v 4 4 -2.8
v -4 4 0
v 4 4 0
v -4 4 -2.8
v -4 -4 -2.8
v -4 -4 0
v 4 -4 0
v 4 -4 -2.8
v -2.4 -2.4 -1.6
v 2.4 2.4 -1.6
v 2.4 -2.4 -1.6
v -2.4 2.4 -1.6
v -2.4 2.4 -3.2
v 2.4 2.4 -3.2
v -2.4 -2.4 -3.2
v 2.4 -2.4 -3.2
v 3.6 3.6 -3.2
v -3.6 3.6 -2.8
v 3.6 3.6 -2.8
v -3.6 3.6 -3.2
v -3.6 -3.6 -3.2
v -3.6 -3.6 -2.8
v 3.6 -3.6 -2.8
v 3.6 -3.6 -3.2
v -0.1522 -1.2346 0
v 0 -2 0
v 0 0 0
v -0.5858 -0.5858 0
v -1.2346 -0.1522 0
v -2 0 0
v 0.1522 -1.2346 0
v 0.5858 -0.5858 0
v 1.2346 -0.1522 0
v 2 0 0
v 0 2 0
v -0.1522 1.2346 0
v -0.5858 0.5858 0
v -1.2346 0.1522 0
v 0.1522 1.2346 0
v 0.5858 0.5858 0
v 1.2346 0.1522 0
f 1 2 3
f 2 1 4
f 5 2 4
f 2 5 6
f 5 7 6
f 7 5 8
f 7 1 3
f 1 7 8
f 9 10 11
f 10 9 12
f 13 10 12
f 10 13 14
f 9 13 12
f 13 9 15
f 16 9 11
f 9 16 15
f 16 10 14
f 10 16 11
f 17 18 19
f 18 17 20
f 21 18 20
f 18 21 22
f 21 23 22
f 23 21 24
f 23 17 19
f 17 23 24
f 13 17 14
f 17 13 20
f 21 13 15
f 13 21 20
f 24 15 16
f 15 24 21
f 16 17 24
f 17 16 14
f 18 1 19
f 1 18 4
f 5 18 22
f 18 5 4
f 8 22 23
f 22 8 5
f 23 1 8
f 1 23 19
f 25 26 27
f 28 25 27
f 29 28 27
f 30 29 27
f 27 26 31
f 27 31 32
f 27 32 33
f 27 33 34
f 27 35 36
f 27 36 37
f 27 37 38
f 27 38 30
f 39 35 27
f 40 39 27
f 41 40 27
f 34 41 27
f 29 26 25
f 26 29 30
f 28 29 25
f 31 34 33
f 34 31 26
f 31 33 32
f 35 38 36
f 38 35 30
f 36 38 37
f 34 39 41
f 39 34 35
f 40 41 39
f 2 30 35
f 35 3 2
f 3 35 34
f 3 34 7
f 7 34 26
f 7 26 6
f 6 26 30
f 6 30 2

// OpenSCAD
// file: ../p/box5.scad
use <../lib.scad>
function ldraw_lib__box5() = [
// 0 Box with 5 Faces and All Edges
// 0 Name: box5.dat
// 0 Author: James Jessiman
// 0 !LDRAW_ORG Primitive UPDATE 2012-01
// 0 !LICENSE Licensed under CC BY 4.0 : see CAreadme.txt
// 
// 0 BFC CERTIFY CCW
  [0,"BFC","CERTIFY"],
  [0,"BFC","CCW"],
// 
// 0 !HISTORY 2002-04-03 [sbliss] Modified for BFC compliance
// 0 !HISTORY 2002-04-25 [PTadmin] Official Update 2002-02
// 0 !HISTORY 2007-06-24 [PTadmin] Header formatted for Contributor Agreement
// 0 !HISTORY 2008-07-01 [PTadmin] Official Update 2008-01
// 0 !HISTORY 2012-02-16 [Philo] Changed to CCW
// 0 !HISTORY 2012-03-30 [PTadmin] Official Update 2012-01
// 
// 
// 2 24 1 1 1 -1 1 1
  [2,24,1,1,1,-1,1,1],
// 2 24 -1 1 1 -1 1 -1
  [2,24,-1,1,1,-1,1,-1],
// 2 24 -1 1 -1 1 1 -1
  [2,24,-1,1,-1,1,1,-1],
// 2 24 1 1 -1 1 1 1
  [2,24,1,1,-1,1,1,1],
// 2 24 1 0 1 -1 0 1
  [2,24,1,0,1,-1,0,1],
// 2 24 -1 0 1 -1 0 -1
  [2,24,-1,0,1,-1,0,-1],
// 2 24 -1 0 -1 1 0 -1
  [2,24,-1,0,-1,1,0,-1],
// 2 24 1 0 -1 1 0 1
  [2,24,1,0,-1,1,0,1],
// 2 24 1 0 1 1 1 1
  [2,24,1,0,1,1,1,1],
// 2 24 -1 0 1 -1 1 1
  [2,24,-1,0,1,-1,1,1],
// 2 24 1 0 -1 1 1 -1
  [2,24,1,0,-1,1,1,-1],
// 2 24 -1 0 -1 -1 1 -1
  [2,24,-1,0,-1,-1,1,-1],
// 4 16 -1 1 1 1 1 1 1 1 -1 -1 1 -1
  [4,16,-1,1,1,1,1,1,1,1,-1,-1,1,-1],
// 4 16 -1 1 1 -1 0 1 1 0 1 1 1 1
  [4,16,-1,1,1,-1,0,1,1,0,1,1,1,1],
// 4 16 -1 1 -1 -1 0 -1 -1 0 1 -1 1 1
  [4,16,-1,1,-1,-1,0,-1,-1,0,1,-1,1,1],
// 4 16 1 1 -1 1 0 -1 -1 0 -1 -1 1 -1
  [4,16,1,1,-1,1,0,-1,-1,0,-1,-1,1,-1],
// 4 16 1 1 1 1 0 1 1 0 -1 1 1 -1
  [4,16,1,1,1,1,0,1,1,0,-1,1,1,-1],
];
module ldraw_lib__box5(step=0, col=false, unit=2/5, alt=false, line=0.2, solid=!$preview)
    makepoly(ldraw_lib__box5(), step=step, col=col, unit=unit, alt=alt, line=line, solid=solid);
ldraw_lib__box5(line=0.2);
// file: ../p/box4.scad
use <../lib.scad>
function ldraw_lib__box4() = [
// 0 Box with 4 Faces (2 Parallel Pairs) and All Edges
// 0 Name: box4.dat
// 0 Author: James Jessiman
// 0 !LDRAW_ORG Primitive UPDATE 2012-01
// 0 !LICENSE Licensed under CC BY 4.0 : see CAreadme.txt
// 
// 0 BFC CERTIFY CCW
  [0,"BFC","CERTIFY"],
  [0,"BFC","CCW"],
// 
// 0 !HISTORY 2002-04-03 [sbliss] Modified for BFC compliance
// 0 !HISTORY 2002-04-25 [PTadmin] Official Update 2002-02
// 0 !HISTORY 2007-06-24 [PTadmin] Header formatted for Contributor Agreement
// 0 !HISTORY 2008-07-01 [PTadmin] Official Update 2008-01
// 0 !HISTORY 2012-02-16 [Philo] Changed to CCW
// 0 !HISTORY 2012-03-30 [PTadmin] Official Update 2012-01
// 
// 
// 2 24 1 1 1 -1 1 1
  [2,24,1,1,1,-1,1,1],
// 2 24 -1 1 1 -1 1 -1
  [2,24,-1,1,1,-1,1,-1],
// 2 24 -1 1 -1 1 1 -1
  [2,24,-1,1,-1,1,1,-1],
// 2 24 1 1 -1 1 1 1
  [2,24,1,1,-1,1,1,1],
// 2 24 1 0 1 -1 0 1
  [2,24,1,0,1,-1,0,1],
// 2 24 -1 0 1 -1 0 -1
  [2,24,-1,0,1,-1,0,-1],
// 2 24 -1 0 -1 1 0 -1
  [2,24,-1,0,-1,1,0,-1],
// 2 24 1 0 -1 1 0 1
  [2,24,1,0,-1,1,0,1],
// 2 24 1 0 1 1 1 1
  [2,24,1,0,1,1,1,1],
// 2 24 -1 0 1 -1 1 1
  [2,24,-1,0,1,-1,1,1],
// 2 24 1 0 -1 1 1 -1
  [2,24,1,0,-1,1,1,-1],
// 2 24 -1 0 -1 -1 1 -1
  [2,24,-1,0,-1,-1,1,-1],
// 4 16 -1 1 1 -1 0 1 1 0 1 1 1 1
  [4,16,-1,1,1,-1,0,1,1,0,1,1,1,1],
// 4 16 -1 1 -1 -1 0 -1 -1 0 1 -1 1 1
  [4,16,-1,1,-1,-1,0,-1,-1,0,1,-1,1,1],
// 4 16 1 1 -1 1 0 -1 -1 0 -1 -1 1 -1
  [4,16,1,1,-1,1,0,-1,-1,0,-1,-1,1,-1],
// 4 16 1 1 1 1 0 1 1 0 -1 1 1 -1
  [4,16,1,1,1,1,0,1,1,0,-1,1,1,-1],
];
module ldraw_lib__box4(step=0, col=false, unit=2/5, alt=false, line=0.2, solid=!$preview)
    makepoly(ldraw_lib__box4(), step=step, col=col, unit=unit, alt=alt, line=line, solid=solid);
ldraw_lib__box4(line=0.2);
// file: s/3070bs01.scad
use <../../lib.scad>
use <../../p/box4.scad>
use <../../p/box5.scad>
function ldraw_lib__s__3070bs01() = [
// 0 ~Tile  1 x  1 with Groove without Top Face
// 0 Name: s\3070bs01.dat
// 0 Author: Chris Dee [cwdee]
// 0 !LDRAW_ORG Subpart UPDATE 2009-02
// 0 !LICENSE Licensed under CC BY 4.0 : see CAreadme.txt
// 
// 0 BFC CERTIFY CCW
  [0,"BFC","CERTIFY"],
  [0,"BFC","CCW"],
// 
// 0 !HISTORY 2009-09-03 [PTadmin] Official Update 2009-02
// 
// 
// 1 16 0 0 0 10 0 0 0 7 0 0 0 10 box4.dat
  [1,16,0,0,0,10,0,0,0,7,0,0,0,10, ldraw_lib__box4()],
// 0 BFC INVERTNEXT
  [0,"BFC","INVERTNEXT"],
// 1 16 0 8 0 6 0 0 0 -4 0 0 0 6 box5.dat
  [1,16,0,8,0,6,0,0,0,-4,0,0,0,6, ldraw_lib__box5()],
// 1 16 0 7 0 9 0 0 0 1 0 0 0 9 box4.dat
  [1,16,0,7,0,9,0,0,0,1,0,0,0,9, ldraw_lib__box4()],
// 
// 4 16 9 8 9 6 8 6 -6 8 6 -9 8 9
  [4,16,9,8,9,6,8,6,-6,8,6,-9,8,9],
// 4 16 -9 8 9 -6 8 6 -6 8 -6 -9 8 -9
  [4,16,-9,8,9,-6,8,6,-6,8,-6,-9,8,-9],
// 4 16 -9 8 -9 -6 8 -6 6 8 -6 9 8 -9
  [4,16,-9,8,-9,-6,8,-6,6,8,-6,9,8,-9],
// 4 16 9 8 -9 6 8 -6 6 8 6 9 8 9
  [4,16,9,8,-9,6,8,-6,6,8,6,9,8,9],
// 
// 4 16 10 7 10 9 7 9 -9 7 9 -10 7 10
  [4,16,10,7,10,9,7,9,-9,7,9,-10,7,10],
// 4 16 -10 7 10 -9 7 9 -9 7 -9 -10 7 -10
  [4,16,-10,7,10,-9,7,9,-9,7,-9,-10,7,-10],
// 4 16 -10 7 -10 -9 7 -9 9 7 -9 10 7 -10
  [4,16,-10,7,-10,-9,7,-9,9,7,-9,10,7,-10],
// 4 16 10 7 -10 9 7 -9 9 7 9 10 7 10
  [4,16,10,7,-10,9,7,-9,9,7,9,10,7,10],
// 0
];
module ldraw_lib__s__3070bs01(step=0, col=false, unit=2/5, alt=false, line=0.2, solid=!$preview)
    makepoly(ldraw_lib__s__3070bs01(), step=step, col=col, unit=unit, alt=alt, line=line, solid=solid);
ldraw_lib__s__3070bs01(line=0.2);
// file: ../p/1-4ndis.scad
use <../lib.scad>
function ldraw_lib__1_4ndis() = [
// 0 Disc Negative 0.25
// 0 Name: 1-4ndis.dat
// 0 Author: James Jessiman
// 0 !LDRAW_ORG Primitive UPDATE 2012-01
// 0 !LICENSE Licensed under CC BY 4.0 : see CAreadme.txt
// 
// 0 BFC CERTIFY CCW
  [0,"BFC","CERTIFY"],
  [0,"BFC","CCW"],
// 
// 0 !HISTORY 2002-03-23 [sbliss] Added BFC Statement
// 0 !HISTORY 2002-04-25 [PTadmin] Official Update 2002-02
// 0 !HISTORY 2007-06-22 [PTadmin] Header formatted for Contributor Agreement
// 0 !HISTORY 2008-07-01 [PTadmin] Official Update 2008-01
// 0 !HISTORY 2012-02-16 [Philo] Changed to CCW
// 0 !HISTORY 2012-03-30 [PTadmin] Official Update 2012-01
// 
// 
// 3 16 0.9239 0 0.3827 1 0 0 1 0 1
  [3,16,0.9239,0,0.3827,1,0,0,1,0,1],
// 3 16 0.7071 0 0.7071 0.9239 0 0.3827 1 0 1
  [3,16,0.7071,0,0.7071,0.9239,0,0.3827,1,0,1],
// 3 16 0.3827 0 0.9239 0.7071 0 0.7071 1 0 1
  [3,16,0.3827,0,0.9239,0.7071,0,0.7071,1,0,1],
// 3 16 0 0 1 0.3827 0 0.9239 1 0 1
  [3,16,0,0,1,0.3827,0,0.9239,1,0,1],
];
module ldraw_lib__1_4ndis(step=0, col=false, unit=2/5, alt=false, line=0.2, solid=!$preview)
    makepoly(ldraw_lib__1_4ndis(), step=step, col=col, unit=unit, alt=alt, line=line, solid=solid);
ldraw_lib__1_4ndis(line=0.2);
// file: ../p/1-4chrd.scad
use <../lib.scad>
function ldraw_lib__1_4chrd() = [
// 0 Chord 0.25
// 0 Name: 1-4chrd.dat
// 0 Author: Tony Hafner [hafhead]
// 0 !LDRAW_ORG Primitive UPDATE 2012-02
// 0 !LICENSE Licensed under CC BY 2.0 and CC BY 4.0 : see CAreadme.txt
// 
// 0 BFC CERTIFY CCW
  [0,"BFC","CERTIFY"],
  [0,"BFC","CCW"],
// 
// 0 !HISTORY 2004-04-22 [PTadmin] Official Update 2004-02
// 0 !HISTORY 2007-10-09 [PTadmin] Header formatted for Contributor Agreement
// 0 !HISTORY 2008-07-01 [PTadmin] Official Update 2008-01
// 0 !HISTORY 2012-08-02 [MMR1988] Re-creation with PrimGen2 and Rectifier
// 0 !HISTORY 2012-08-09 [PTadmin] Official Update 2012-02
// 
// 
// 4 16 0.9239 0 0.3827 0.3827 0 0.9239 0 0 1 1 0 0
  [4,16,0.9239,0,0.3827,0.3827,0,0.9239,0,0,1,1,0,0],
// 3 16 0.7071 0 0.7071 0.3827 0 0.9239 0.9239 0 0.3827
  [3,16,0.7071,0,0.7071,0.3827,0,0.9239,0.9239,0,0.3827],
];
module ldraw_lib__1_4chrd(step=0, col=false, unit=2/5, alt=false, line=0.2, solid=!$preview)
    makepoly(ldraw_lib__1_4chrd(), step=step, col=col, unit=unit, alt=alt, line=line, solid=solid);
ldraw_lib__1_4chrd(line=0.2);
// main file
use <../lib.scad>
use <../p/1-4chrd.scad>
use <../p/1-4ndis.scad>
use <s/3070bs01.scad>
function ldraw_lib__3070bpx0() = [
// 0 Tile  1 x  1 with White Star Pattern
// 0 Name: 3070bpx0.dat
// 0 Author: Vincent Messenet [Cheenzo]
// 0 !LDRAW_ORG Part UPDATE 2023-03
// 0 !LICENSE Licensed under CC BY 4.0 : see CAreadme.txt
// 
// 0 BFC CERTIFY CCW
  [0,"BFC","CERTIFY"],
  [0,"BFC","CCW"],
// 
// 0 !KEYWORDS Rebrickable 3070bpr0297, Set 21340, BrickOwl 125686
// 
// 0 !HISTORY 2023-06-24 [OrionP] Official Update 2023-03
// 
// 
// 1 16 0 0 0 1 0 0 0 1 0 0 0 1 s\3070bs01.dat
  [1,16,0,0,0,1,0,0,0,1,0,0,0,1, ldraw_lib__s__3070bs01()],
// 
// 1 15 -5 0 -5 5 0 0 0 1 0 0 0 5 1-4ndis.dat
  [1,15,-5,0,-5,5,0,0,0,1,0,0,0,5, ldraw_lib__1_4ndis()],
// 1 15 5 0 -5 -5 0 0 0 1 0 0 0 5 1-4ndis.dat
  [1,15,5,0,-5,-5,0,0,0,1,0,0,0,5, ldraw_lib__1_4ndis()],
// 1 15 -5 0 5 5 0 0 0 1 0 0 0 -5 1-4ndis.dat
  [1,15,-5,0,5,5,0,0,0,1,0,0,0,-5, ldraw_lib__1_4ndis()],
// 1 15 5 0 5 -5 0 0 0 1 0 0 0 -5 1-4ndis.dat
  [1,15,5,0,5,-5,0,0,0,1,0,0,0,-5, ldraw_lib__1_4ndis()],
// 1 16 -5 0 -5 5 0 0 0 1 0 0 0 5 1-4chrd.dat
  [1,16,-5,0,-5,5,0,0,0,1,0,0,0,5, ldraw_lib__1_4chrd()],
// 1 16 5 0 -5 -5 0 0 0 1 0 0 0 5 1-4chrd.dat
  [1,16,5,0,-5,-5,0,0,0,1,0,0,0,5, ldraw_lib__1_4chrd()],
// 1 16 -5 0 5 5 0 0 0 1 0 0 0 -5 1-4chrd.dat
  [1,16,-5,0,5,5,0,0,0,1,0,0,0,-5, ldraw_lib__1_4chrd()],
// 1 16 5 0 5 -5 0 0 0 1 0 0 0 -5 1-4chrd.dat
  [1,16,5,0,5,-5,0,0,0,1,0,0,0,-5, ldraw_lib__1_4chrd()],
// 3 16 -10 0 10 -5 0 0 0 0 5
  [3,16,-10,0,10,-5,0,0,0,0,5],
// 3 16 0 0 5 10 0 10 -10 0 10
  [3,16,0,0,5,10,0,10,-10,0,10],
// 3 16 10 0 10 0 0 5 5 0 0
  [3,16,10,0,10,0,0,5,5,0,0],
// 3 16 10 0 10 5 0 0 10 0 -10
  [3,16,10,0,10,5,0,0,10,0,-10],
// 3 16 10 0 -10 5 0 0 0 0 -5
  [3,16,10,0,-10,5,0,0,0,0,-5],
// 3 16 10 0 -10 0 0 -5 -10 0 -10
  [3,16,10,0,-10,0,0,-5,-10,0,-10],
// 3 16 -10 0 -10 0 0 -5 -5 0 0
  [3,16,-10,0,-10,0,0,-5,-5,0,0],
// 3 16 -10 0 -10 -5 0 0 -10 0 10
  [3,16,-10,0,-10,-5,0,0,-10,0,10],
];
module ldraw_lib__3070bpx0(step=0, col=false, unit=2/5, alt=false, line=0.2, solid=!$preview)
    makepoly(ldraw_lib__3070bpx0(), step=step, col=col, unit=unit, alt=alt, line=line, solid=solid);
ldraw_lib__3070bpx0(line=0.2);
